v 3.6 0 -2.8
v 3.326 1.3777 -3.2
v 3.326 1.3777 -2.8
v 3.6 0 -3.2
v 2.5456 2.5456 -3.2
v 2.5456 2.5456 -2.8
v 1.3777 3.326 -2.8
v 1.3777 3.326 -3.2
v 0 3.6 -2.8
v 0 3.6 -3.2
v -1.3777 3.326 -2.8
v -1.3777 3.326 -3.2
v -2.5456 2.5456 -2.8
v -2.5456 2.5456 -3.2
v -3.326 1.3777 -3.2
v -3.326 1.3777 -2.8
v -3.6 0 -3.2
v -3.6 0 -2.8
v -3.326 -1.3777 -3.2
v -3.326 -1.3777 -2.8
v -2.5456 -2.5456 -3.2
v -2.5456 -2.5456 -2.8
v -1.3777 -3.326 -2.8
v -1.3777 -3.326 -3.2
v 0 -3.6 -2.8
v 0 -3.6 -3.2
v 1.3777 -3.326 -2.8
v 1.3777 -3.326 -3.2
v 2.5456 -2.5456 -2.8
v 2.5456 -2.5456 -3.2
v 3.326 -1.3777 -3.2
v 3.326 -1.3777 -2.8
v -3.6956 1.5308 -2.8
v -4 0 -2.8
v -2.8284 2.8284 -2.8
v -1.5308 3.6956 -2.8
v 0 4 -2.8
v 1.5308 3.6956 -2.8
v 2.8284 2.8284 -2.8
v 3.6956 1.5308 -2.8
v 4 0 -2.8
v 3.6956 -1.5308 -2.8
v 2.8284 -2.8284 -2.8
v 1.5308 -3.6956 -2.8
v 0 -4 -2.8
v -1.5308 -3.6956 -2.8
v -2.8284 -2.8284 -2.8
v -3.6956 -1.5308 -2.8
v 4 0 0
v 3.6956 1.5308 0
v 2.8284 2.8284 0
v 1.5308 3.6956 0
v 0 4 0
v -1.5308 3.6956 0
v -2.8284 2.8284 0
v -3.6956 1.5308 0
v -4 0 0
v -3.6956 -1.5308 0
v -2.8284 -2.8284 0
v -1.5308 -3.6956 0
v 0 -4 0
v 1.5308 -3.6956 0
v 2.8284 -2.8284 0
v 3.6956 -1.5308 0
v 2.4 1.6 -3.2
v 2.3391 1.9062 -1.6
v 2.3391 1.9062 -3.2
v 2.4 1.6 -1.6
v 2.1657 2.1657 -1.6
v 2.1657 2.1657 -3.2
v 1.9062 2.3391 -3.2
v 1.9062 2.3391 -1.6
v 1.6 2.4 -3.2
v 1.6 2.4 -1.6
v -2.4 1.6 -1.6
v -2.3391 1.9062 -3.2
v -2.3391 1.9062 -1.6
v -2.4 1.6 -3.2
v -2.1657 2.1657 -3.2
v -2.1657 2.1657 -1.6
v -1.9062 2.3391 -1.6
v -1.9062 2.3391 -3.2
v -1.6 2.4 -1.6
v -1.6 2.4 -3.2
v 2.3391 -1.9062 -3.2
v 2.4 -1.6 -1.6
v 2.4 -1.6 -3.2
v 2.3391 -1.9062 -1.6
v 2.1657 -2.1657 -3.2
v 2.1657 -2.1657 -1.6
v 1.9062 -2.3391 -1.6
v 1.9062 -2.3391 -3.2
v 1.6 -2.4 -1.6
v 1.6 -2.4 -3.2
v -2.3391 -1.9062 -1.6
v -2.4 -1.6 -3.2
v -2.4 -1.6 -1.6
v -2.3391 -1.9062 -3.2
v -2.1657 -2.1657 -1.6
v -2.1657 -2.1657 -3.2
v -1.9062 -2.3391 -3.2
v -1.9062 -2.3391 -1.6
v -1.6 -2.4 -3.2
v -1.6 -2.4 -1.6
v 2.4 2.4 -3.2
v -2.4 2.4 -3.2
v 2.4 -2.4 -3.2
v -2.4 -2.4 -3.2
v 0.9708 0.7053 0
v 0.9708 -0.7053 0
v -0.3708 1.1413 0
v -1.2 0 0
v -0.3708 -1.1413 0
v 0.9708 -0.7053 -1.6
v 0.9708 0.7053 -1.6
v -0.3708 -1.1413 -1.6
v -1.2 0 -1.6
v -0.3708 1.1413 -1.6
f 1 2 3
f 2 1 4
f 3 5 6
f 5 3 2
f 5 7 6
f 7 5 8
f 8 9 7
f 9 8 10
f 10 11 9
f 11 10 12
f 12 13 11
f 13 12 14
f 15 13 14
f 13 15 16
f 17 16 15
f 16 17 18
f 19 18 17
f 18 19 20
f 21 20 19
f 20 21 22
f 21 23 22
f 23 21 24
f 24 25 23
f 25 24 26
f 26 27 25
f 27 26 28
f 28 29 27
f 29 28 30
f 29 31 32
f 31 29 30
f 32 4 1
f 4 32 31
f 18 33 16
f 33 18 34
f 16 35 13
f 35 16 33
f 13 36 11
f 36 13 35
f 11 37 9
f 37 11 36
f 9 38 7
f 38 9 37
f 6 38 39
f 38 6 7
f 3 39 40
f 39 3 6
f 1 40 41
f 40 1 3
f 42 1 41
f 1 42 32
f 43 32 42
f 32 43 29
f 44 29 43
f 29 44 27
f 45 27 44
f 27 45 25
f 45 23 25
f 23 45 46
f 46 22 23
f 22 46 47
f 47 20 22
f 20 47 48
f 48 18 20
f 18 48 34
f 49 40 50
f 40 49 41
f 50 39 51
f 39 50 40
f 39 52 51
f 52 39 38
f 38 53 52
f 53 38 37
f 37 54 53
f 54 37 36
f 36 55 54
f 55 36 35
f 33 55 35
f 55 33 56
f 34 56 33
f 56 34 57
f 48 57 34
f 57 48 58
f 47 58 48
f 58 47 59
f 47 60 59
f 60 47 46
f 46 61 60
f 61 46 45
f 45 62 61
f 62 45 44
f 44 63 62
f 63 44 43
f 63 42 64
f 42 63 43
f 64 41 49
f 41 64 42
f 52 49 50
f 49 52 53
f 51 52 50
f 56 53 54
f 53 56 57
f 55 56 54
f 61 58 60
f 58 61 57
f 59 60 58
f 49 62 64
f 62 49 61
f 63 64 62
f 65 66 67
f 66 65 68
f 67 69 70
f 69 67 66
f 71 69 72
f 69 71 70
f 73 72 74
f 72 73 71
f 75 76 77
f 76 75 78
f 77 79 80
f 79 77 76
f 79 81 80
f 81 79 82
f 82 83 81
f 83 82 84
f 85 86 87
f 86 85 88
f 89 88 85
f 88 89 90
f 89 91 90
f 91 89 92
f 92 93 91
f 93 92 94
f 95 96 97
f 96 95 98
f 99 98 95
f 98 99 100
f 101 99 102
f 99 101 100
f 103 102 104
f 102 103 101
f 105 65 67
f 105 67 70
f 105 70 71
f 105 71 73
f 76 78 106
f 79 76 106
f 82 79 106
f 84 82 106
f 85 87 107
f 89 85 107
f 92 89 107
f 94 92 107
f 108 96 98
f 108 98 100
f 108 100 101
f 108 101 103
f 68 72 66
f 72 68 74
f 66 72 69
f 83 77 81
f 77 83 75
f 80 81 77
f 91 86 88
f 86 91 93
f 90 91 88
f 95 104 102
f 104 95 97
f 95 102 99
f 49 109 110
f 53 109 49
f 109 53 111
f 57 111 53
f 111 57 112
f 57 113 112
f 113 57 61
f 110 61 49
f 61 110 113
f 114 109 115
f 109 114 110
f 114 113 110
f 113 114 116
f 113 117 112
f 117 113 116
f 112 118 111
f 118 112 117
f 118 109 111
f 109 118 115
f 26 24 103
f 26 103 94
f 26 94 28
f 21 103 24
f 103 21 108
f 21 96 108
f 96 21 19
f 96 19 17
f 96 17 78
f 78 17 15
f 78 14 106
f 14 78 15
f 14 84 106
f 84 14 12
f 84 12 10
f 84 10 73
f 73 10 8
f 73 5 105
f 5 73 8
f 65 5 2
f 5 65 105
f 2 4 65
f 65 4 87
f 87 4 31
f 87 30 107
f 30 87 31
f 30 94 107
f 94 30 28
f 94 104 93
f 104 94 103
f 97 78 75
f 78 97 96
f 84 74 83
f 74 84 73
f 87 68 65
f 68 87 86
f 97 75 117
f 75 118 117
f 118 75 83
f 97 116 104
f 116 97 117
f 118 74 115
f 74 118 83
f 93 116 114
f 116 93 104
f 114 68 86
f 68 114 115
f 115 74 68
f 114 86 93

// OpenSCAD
use <../../lib.scad>
use <../../p/1-4chrd.scad>
use <../../p/1-4cylo.scad>
use <../../p/1-4ndis.scad>
use <../../p/4-4cylo.scad>
use <../../p/4-4ering.scad>
use <../../p/4-4ring9.scad>
$fa=1; $fs=0.2;
function ldraw_lib__s__72046s01(realsolid=false) = [
// 0 ~Tile  1 x  1 x  0.5 Round with Raised Star Gem - Base
// 0 Name: s\72046s01.dat
// 0 Author: Takeshi Takahashi [RainbowDolphin]
// 0 !LDRAW_ORG Subpart UPDATE 2022-05
// 0 !LICENSE Licensed under CC BY 2.0 and CC BY 4.0 : see CAreadme.txt
// 
// 0 BFC CERTIFY CCW
  [0,"BFC","CERTIFY"],
  [0,"BFC","CCW"],
// 
// 0 !HISTORY 2022-09-15 [PTadmin] Official Update 2022-05
// 
// 
// 1 16 0 8 0 -9 0 0 0 -1 0 0 0 9 4-4ering.dat
  [1,16,0,8,0,-9,0,0,0,-1,0,0,0,9, ldraw_lib__4_4ering(realsolid)],
// 1 16 0 7 0 9 0 0 0 1 0 0 0 9 4-4cylo.dat
  [1,16,0,7,0,9,0,0,0,1,0,0,0,9, ldraw_lib__4_4cylo(realsolid)],
// 1 16 0 7 0 -1 0 0 0 -1 0 0 0 1 4-4ring9.dat
  [1,16,0,7,0,-1,0,0,0,-1,0,0,0,1, ldraw_lib__4_4ring9(realsolid)],
// 1 16 0 0 0 10 0 0 0 7 0 0 0 10 4-4cylo.dat
  [1,16,0,0,0,10,0,0,0,7,0,0,0,10, ldraw_lib__4_4cylo(realsolid)],
// 
// 1 16 0 0 0 10 0 0 0 1 0 0 0 10 1-4chrd.dat
  [1,16,0,0,0,10,0,0,0,1,0,0,0,10, ldraw_lib__1_4chrd(realsolid)],
// 1 16 0 0 0 0 0 -10 0 1 0 10 0 0 1-4chrd.dat
  [1,16,0,0,0,0,0,-10,0,1,0,10,0,0, ldraw_lib__1_4chrd(realsolid)],
// 1 16 0 0 0 -10 0 0 0 1 0 0 0 -10 1-4chrd.dat
  [1,16,0,0,0,-10,0,0,0,1,0,0,0,-10, ldraw_lib__1_4chrd(realsolid)],
// 1 16 0 0 0 0 0 10 0 1 0 -10 0 0 1-4chrd.dat
  [1,16,0,0,0,0,0,10,0,1,0,-10,0,0, ldraw_lib__1_4chrd(realsolid)],
// 0 BFC INVERTNEXT
  [0,"BFC","INVERTNEXT"],
// 1 16 4 8 4 2 0 0 0 -4 0 0 0 2 1-4cylo.dat
  [1,16,4,8,4,2,0,0,0,-4,0,0,0,2, ldraw_lib__1_4cylo(realsolid)],
// 0 BFC INVERTNEXT
  [0,"BFC","INVERTNEXT"],
// 1 16 -4 8 4 -2 0 0 0 -4 0 0 0 2 1-4cylo.dat
  [1,16,-4,8,4,-2,0,0,0,-4,0,0,0,2, ldraw_lib__1_4cylo(realsolid)],
// 0 BFC INVERTNEXT
  [0,"BFC","INVERTNEXT"],
// 1 16 4 8 -4 2 0 0 0 -4 0 0 0 -2 1-4cylo.dat
  [1,16,4,8,-4,2,0,0,0,-4,0,0,0,-2, ldraw_lib__1_4cylo(realsolid)],
// 0 BFC INVERTNEXT
  [0,"BFC","INVERTNEXT"],
// 1 16 -4 8 -4 -2 0 0 0 -4 0 0 0 -2 1-4cylo.dat
  [1,16,-4,8,-4,-2,0,0,0,-4,0,0,0,-2, ldraw_lib__1_4cylo(realsolid)],
// 1 16 4 8 4 2 0 0 0 -1 0 0 0 2 1-4ndis.dat
  [1,16,4,8,4,2,0,0,0,-1,0,0,0,2, ldraw_lib__1_4ndis(realsolid)],
// 1 16 -4 8 4 -2 0 0 0 -1 0 0 0 2 1-4ndis.dat
  [1,16,-4,8,4,-2,0,0,0,-1,0,0,0,2, ldraw_lib__1_4ndis(realsolid)],
// 1 16 4 8 -4 2 0 0 0 -1 0 0 0 -2 1-4ndis.dat
  [1,16,4,8,-4,2,0,0,0,-1,0,0,0,-2, ldraw_lib__1_4ndis(realsolid)],
// 1 16 -4 8 -4 -2 0 0 0 -1 0 0 0 -2 1-4ndis.dat
  [1,16,-4,8,-4,-2,0,0,0,-1,0,0,0,-2, ldraw_lib__1_4ndis(realsolid)],
// 1 16 4 4 4 2 0 0 0 -1 0 0 0 2 1-4chrd.dat
  [1,16,4,4,4,2,0,0,0,-1,0,0,0,2, ldraw_lib__1_4chrd(realsolid)],
// 1 16 -4 4 4 -2 0 0 0 -1 0 0 0 2 1-4chrd.dat
  [1,16,-4,4,4,-2,0,0,0,-1,0,0,0,2, ldraw_lib__1_4chrd(realsolid)],
// 1 16 4 4 -4 2 0 0 0 -1 0 0 0 -2 1-4chrd.dat
  [1,16,4,4,-4,2,0,0,0,-1,0,0,0,-2, ldraw_lib__1_4chrd(realsolid)],
// 1 16 -4 4 -4 -2 0 0 0 -1 0 0 0 -2 1-4chrd.dat
  [1,16,-4,4,-4,-2,0,0,0,-1,0,0,0,-2, ldraw_lib__1_4chrd(realsolid)],
// 3 16 10 0 0 2.42706 0 1.76337 2.42706 0 -1.76337
  [3,16,10,0,0,2.42706,0,1.76337,2.42706,0,-1.76337],
// 4 16 -.92706 0 2.85318 2.42706 0 1.76337 10 0 0 0 0 10
  [4,16,-.92706,0,2.85318,2.42706,0,1.76337,10,0,0,0,0,10],
// 4 16 -3 0 0 -.92706 0 2.85318 0 0 10 -10 0 0
  [4,16,-3,0,0,-.92706,0,2.85318,0,0,10,-10,0,0],
// 4 16 -.92706 0 -2.85318 -3 0 0 -10 0 0 0 0 -10
  [4,16,-.92706,0,-2.85318,-3,0,0,-10,0,0,0,0,-10],
// 4 16 -.92706 0 -2.85318 0 0 -10 10 0 0 2.42706 0 -1.76337
  [4,16,-.92706,0,-2.85318,0,0,-10,10,0,0,2.42706,0,-1.76337],
// 2 24 2.42706 0 -1.76337 2.42706 0 1.76337
  [2,24,2.42706,0,-1.76337,2.42706,0,1.76337],
// 2 24 2.42706 0 1.76337 -.92706 0 2.85318
  [2,24,2.42706,0,1.76337,-.92706,0,2.85318],
// 2 24 -.92706 0 2.85318 -3 0 0
  [2,24,-.92706,0,2.85318,-3,0,0],
// 2 24 -3 0 0 -.92706 0 -2.85318
  [2,24,-3,0,0,-.92706,0,-2.85318],
// 2 24 -.92706 0 -2.85318 2.42706 0 -1.76337
  [2,24,-.92706,0,-2.85318,2.42706,0,-1.76337],
// 4 16 2.42706 0 1.76337 2.42706 4 1.76337 2.42706 4 -1.76337 2.42706 0 -1.76337
  [4,16,2.42706,0,1.76337,2.42706,4,1.76337,2.42706,4,-1.76337,2.42706,0,-1.76337],
// 4 16 2.42706 0 -1.76337 2.42706 4 -1.76337 -.92706 4 -2.85318 -.92706 0 -2.85318
  [4,16,2.42706,0,-1.76337,2.42706,4,-1.76337,-.92706,4,-2.85318,-.92706,0,-2.85318],
// 4 16 -3 0 0 -.92706 0 -2.85318 -.92706 4 -2.85318 -3 4 0
  [4,16,-3,0,0,-.92706,0,-2.85318,-.92706,4,-2.85318,-3,4,0],
// 4 16 -3 0 0 -3 4 0 -.92706 4 2.85318 -.92706 0 2.85318
  [4,16,-3,0,0,-3,4,0,-.92706,4,2.85318,-.92706,0,2.85318],
// 4 16 -.92706 0 2.85318 -.92706 4 2.85318 2.42706 4 1.76337 2.42706 0 1.76337
  [4,16,-.92706,0,2.85318,-.92706,4,2.85318,2.42706,4,1.76337,2.42706,0,1.76337],
// 2 24 2.42706 0 1.76337 2.42706 4 1.76337
  [2,24,2.42706,0,1.76337,2.42706,4,1.76337],
// 2 24 -.92706 0 2.85318 -.92706 4 2.85318
  [2,24,-.92706,0,2.85318,-.92706,4,2.85318],
// 2 24 -3 0 0 -3 4 0
  [2,24,-3,0,0,-3,4,0],
// 2 24 -.92706 0 -2.85318 -.92706 4 -2.85318
  [2,24,-.92706,0,-2.85318,-.92706,4,-2.85318],
// 2 24 2.42706 4 -1.76337 2.42706 0 -1.76337
  [2,24,2.42706,4,-1.76337,2.42706,0,-1.76337],
// 3 16 0 8 -9 -3.4443 8 -8.3151 -4 8 -6
  [3,16,0,8,-9,-3.4443,8,-8.3151,-4,8,-6],
// 3 16 0 8 -9 -4 8 -6 4 8 -6
  [3,16,0,8,-9,-4,8,-6,4,8,-6],
// 3 16 0 8 -9 4 8 -6 3.4443 8 -8.3151
  [3,16,0,8,-9,4,8,-6,3.4443,8,-8.3151],
// 4 16 -6 8 -6 -4 8 -6 -3.4443 8 -8.3151 -6.3639 8 -6.3639
  [4,16,-6,8,-6,-4,8,-6,-3.4443,8,-8.3151,-6.3639,8,-6.3639],
// 4 16 -6 8 -4 -6 8 -6 -6.3639 8 -6.3639 -8.3151 8 -3.4443
  [4,16,-6,8,-4,-6,8,-6,-6.3639,8,-6.3639,-8.3151,8,-3.4443],
// 3 16 -6 8 -4 -8.3151 8 -3.4443 -9 8 0
  [3,16,-6,8,-4,-8.3151,8,-3.4443,-9,8,0],
// 3 16 -6 8 -4 -9 8 0 -6 8 4
  [3,16,-6,8,-4,-9,8,0,-6,8,4],
// 3 16 -6 8 4 -9 8 0 -8.3151 8 3.4443
  [3,16,-6,8,4,-9,8,0,-8.3151,8,3.4443],
// 4 16 -6 8 6 -6 8 4 -8.3151 8 3.4443 -6.3639 8 6.3639
  [4,16,-6,8,6,-6,8,4,-8.3151,8,3.4443,-6.3639,8,6.3639],
// 4 16 -4 8 6 -6 8 6 -6.3639 8 6.3639 -3.4443 8 8.3151
  [4,16,-4,8,6,-6,8,6,-6.3639,8,6.3639,-3.4443,8,8.3151],
// 3 16 -4 8 6 -3.4443 8 8.3151 0 8 9
  [3,16,-4,8,6,-3.4443,8,8.3151,0,8,9],
// 3 16 -4 8 6 0 8 9 4 8 6
  [3,16,-4,8,6,0,8,9,4,8,6],
// 3 16 4 8 6 0 8 9 3.4443 8 8.3151
  [3,16,4,8,6,0,8,9,3.4443,8,8.3151],
// 4 16 6 8 6 4 8 6 3.4443 8 8.3151 6.3639 8 6.3639
  [4,16,6,8,6,4,8,6,3.4443,8,8.3151,6.3639,8,6.3639],
// 4 16 6 8 4 6 8 6 6.3639 8 6.3639 8.3151 8 3.4443
  [4,16,6,8,4,6,8,6,6.3639,8,6.3639,8.3151,8,3.4443],
// 3 16 8.3151 8 3.4443 9 8 0 6 8 4
  [3,16,8.3151,8,3.4443,9,8,0,6,8,4],
// 3 16 6 8 4 9 8 0 6 8 -4
  [3,16,6,8,4,9,8,0,6,8,-4],
// 3 16 6 8 -4 9 8 0 8.3151 8 -3.4443
  [3,16,6,8,-4,9,8,0,8.3151,8,-3.4443],
// 4 16 6 8 -6 6 8 -4 8.3151 8 -3.4443 6.3639 8 -6.3639
  [4,16,6,8,-6,6,8,-4,8.3151,8,-3.4443,6.3639,8,-6.3639],
// 4 16 4 8 -6 6 8 -6 6.3639 8 -6.3639 3.4443 8 -8.3151
  [4,16,4,8,-6,6,8,-6,6.3639,8,-6.3639,3.4443,8,-8.3151],
// 4 16 4 4 -6 4 8 -6 -4 8 -6 -4 4 -6
  [4,16,4,4,-6,4,8,-6,-4,8,-6,-4,4,-6],
// 4 16 -6 4 4 -6 4 -4 -6 8 -4 -6 8 4
  [4,16,-6,4,4,-6,4,-4,-6,8,-4,-6,8,4],
// 4 16 -4 4 6 -4 8 6 4 8 6 4 4 6
  [4,16,-4,4,6,-4,8,6,4,8,6,4,4,6],
// 4 16 6 4 4 6 8 4 6 8 -4 6 4 -4
  [4,16,6,4,4,6,8,4,6,8,-4,6,4,-4],
// 2 24 6 8 4 6 8 -4
  [2,24,6,8,4,6,8,-4],
// 2 24 4 8 -6 -4 8 -6
  [2,24,4,8,-6,-4,8,-6],
// 2 24 -6 8 -4 -6 8 4
  [2,24,-6,8,-4,-6,8,4],
// 2 24 -4 8 6 4 8 6
  [2,24,-4,8,6,4,8,6],
// 2 24 6 4 4 6 4 -4
  [2,24,6,4,4,6,4,-4],
// 2 24 4 4 -6 -4 4 -6
  [2,24,4,4,-6,-4,4,-6],
// 2 24 -6 4 -4 -6 4 4
  [2,24,-6,4,-4,-6,4,4],
// 2 24 -4 4 6 4 4 6
  [2,24,-4,4,6,4,4,6],
// 3 16 -6 4 -4 -6 4 4 -3 4 0
  [3,16,-6,4,-4,-6,4,4,-3,4,0],
// 4 16 -.92706 4 2.85318 -3 4 0 -6 4 4 -4 4 6
  [4,16,-.92706,4,2.85318,-3,4,0,-6,4,4,-4,4,6],
// 4 16 -.92706 4 -2.85318 -4 4 -6 -6 4 -4 -3 4 0
  [4,16,-.92706,4,-2.85318,-4,4,-6,-6,4,-4,-3,4,0],
// 4 16 2.42706 4 1.76337 -.92706 4 2.85318 -4 4 6 4 4 6
  [4,16,2.42706,4,1.76337,-.92706,4,2.85318,-4,4,6,4,4,6],
// 4 16 -4 4 -6 -.92706 4 -2.85318 2.42706 4 -1.76337 4 4 -6
  [4,16,-4,4,-6,-.92706,4,-2.85318,2.42706,4,-1.76337,4,4,-6],
// 4 16 6 4 -4 2.42706 4 -1.76337 2.42706 4 1.76337 6 4 4
  [4,16,6,4,-4,2.42706,4,-1.76337,2.42706,4,1.76337,6,4,4],
// 3 16 2.42706 4 1.76337 4 4 6 6 4 4
  [3,16,2.42706,4,1.76337,4,4,6,6,4,4],
// 3 16 2.42706 4 -1.76337 6 4 -4 4 4 -6
  [3,16,2.42706,4,-1.76337,6,4,-4,4,4,-6],
];
module ldraw_lib__s__72046s01(step=0, col=false, unit=2/5, alt=false, line=0.2, solid=!$preview)
    makepoly(ldraw_lib__s__72046s01(solid), step=step, col=col, unit=unit, alt=alt, line=line, solid=solid);
ldraw_lib__s__72046s01(line=0.2);
